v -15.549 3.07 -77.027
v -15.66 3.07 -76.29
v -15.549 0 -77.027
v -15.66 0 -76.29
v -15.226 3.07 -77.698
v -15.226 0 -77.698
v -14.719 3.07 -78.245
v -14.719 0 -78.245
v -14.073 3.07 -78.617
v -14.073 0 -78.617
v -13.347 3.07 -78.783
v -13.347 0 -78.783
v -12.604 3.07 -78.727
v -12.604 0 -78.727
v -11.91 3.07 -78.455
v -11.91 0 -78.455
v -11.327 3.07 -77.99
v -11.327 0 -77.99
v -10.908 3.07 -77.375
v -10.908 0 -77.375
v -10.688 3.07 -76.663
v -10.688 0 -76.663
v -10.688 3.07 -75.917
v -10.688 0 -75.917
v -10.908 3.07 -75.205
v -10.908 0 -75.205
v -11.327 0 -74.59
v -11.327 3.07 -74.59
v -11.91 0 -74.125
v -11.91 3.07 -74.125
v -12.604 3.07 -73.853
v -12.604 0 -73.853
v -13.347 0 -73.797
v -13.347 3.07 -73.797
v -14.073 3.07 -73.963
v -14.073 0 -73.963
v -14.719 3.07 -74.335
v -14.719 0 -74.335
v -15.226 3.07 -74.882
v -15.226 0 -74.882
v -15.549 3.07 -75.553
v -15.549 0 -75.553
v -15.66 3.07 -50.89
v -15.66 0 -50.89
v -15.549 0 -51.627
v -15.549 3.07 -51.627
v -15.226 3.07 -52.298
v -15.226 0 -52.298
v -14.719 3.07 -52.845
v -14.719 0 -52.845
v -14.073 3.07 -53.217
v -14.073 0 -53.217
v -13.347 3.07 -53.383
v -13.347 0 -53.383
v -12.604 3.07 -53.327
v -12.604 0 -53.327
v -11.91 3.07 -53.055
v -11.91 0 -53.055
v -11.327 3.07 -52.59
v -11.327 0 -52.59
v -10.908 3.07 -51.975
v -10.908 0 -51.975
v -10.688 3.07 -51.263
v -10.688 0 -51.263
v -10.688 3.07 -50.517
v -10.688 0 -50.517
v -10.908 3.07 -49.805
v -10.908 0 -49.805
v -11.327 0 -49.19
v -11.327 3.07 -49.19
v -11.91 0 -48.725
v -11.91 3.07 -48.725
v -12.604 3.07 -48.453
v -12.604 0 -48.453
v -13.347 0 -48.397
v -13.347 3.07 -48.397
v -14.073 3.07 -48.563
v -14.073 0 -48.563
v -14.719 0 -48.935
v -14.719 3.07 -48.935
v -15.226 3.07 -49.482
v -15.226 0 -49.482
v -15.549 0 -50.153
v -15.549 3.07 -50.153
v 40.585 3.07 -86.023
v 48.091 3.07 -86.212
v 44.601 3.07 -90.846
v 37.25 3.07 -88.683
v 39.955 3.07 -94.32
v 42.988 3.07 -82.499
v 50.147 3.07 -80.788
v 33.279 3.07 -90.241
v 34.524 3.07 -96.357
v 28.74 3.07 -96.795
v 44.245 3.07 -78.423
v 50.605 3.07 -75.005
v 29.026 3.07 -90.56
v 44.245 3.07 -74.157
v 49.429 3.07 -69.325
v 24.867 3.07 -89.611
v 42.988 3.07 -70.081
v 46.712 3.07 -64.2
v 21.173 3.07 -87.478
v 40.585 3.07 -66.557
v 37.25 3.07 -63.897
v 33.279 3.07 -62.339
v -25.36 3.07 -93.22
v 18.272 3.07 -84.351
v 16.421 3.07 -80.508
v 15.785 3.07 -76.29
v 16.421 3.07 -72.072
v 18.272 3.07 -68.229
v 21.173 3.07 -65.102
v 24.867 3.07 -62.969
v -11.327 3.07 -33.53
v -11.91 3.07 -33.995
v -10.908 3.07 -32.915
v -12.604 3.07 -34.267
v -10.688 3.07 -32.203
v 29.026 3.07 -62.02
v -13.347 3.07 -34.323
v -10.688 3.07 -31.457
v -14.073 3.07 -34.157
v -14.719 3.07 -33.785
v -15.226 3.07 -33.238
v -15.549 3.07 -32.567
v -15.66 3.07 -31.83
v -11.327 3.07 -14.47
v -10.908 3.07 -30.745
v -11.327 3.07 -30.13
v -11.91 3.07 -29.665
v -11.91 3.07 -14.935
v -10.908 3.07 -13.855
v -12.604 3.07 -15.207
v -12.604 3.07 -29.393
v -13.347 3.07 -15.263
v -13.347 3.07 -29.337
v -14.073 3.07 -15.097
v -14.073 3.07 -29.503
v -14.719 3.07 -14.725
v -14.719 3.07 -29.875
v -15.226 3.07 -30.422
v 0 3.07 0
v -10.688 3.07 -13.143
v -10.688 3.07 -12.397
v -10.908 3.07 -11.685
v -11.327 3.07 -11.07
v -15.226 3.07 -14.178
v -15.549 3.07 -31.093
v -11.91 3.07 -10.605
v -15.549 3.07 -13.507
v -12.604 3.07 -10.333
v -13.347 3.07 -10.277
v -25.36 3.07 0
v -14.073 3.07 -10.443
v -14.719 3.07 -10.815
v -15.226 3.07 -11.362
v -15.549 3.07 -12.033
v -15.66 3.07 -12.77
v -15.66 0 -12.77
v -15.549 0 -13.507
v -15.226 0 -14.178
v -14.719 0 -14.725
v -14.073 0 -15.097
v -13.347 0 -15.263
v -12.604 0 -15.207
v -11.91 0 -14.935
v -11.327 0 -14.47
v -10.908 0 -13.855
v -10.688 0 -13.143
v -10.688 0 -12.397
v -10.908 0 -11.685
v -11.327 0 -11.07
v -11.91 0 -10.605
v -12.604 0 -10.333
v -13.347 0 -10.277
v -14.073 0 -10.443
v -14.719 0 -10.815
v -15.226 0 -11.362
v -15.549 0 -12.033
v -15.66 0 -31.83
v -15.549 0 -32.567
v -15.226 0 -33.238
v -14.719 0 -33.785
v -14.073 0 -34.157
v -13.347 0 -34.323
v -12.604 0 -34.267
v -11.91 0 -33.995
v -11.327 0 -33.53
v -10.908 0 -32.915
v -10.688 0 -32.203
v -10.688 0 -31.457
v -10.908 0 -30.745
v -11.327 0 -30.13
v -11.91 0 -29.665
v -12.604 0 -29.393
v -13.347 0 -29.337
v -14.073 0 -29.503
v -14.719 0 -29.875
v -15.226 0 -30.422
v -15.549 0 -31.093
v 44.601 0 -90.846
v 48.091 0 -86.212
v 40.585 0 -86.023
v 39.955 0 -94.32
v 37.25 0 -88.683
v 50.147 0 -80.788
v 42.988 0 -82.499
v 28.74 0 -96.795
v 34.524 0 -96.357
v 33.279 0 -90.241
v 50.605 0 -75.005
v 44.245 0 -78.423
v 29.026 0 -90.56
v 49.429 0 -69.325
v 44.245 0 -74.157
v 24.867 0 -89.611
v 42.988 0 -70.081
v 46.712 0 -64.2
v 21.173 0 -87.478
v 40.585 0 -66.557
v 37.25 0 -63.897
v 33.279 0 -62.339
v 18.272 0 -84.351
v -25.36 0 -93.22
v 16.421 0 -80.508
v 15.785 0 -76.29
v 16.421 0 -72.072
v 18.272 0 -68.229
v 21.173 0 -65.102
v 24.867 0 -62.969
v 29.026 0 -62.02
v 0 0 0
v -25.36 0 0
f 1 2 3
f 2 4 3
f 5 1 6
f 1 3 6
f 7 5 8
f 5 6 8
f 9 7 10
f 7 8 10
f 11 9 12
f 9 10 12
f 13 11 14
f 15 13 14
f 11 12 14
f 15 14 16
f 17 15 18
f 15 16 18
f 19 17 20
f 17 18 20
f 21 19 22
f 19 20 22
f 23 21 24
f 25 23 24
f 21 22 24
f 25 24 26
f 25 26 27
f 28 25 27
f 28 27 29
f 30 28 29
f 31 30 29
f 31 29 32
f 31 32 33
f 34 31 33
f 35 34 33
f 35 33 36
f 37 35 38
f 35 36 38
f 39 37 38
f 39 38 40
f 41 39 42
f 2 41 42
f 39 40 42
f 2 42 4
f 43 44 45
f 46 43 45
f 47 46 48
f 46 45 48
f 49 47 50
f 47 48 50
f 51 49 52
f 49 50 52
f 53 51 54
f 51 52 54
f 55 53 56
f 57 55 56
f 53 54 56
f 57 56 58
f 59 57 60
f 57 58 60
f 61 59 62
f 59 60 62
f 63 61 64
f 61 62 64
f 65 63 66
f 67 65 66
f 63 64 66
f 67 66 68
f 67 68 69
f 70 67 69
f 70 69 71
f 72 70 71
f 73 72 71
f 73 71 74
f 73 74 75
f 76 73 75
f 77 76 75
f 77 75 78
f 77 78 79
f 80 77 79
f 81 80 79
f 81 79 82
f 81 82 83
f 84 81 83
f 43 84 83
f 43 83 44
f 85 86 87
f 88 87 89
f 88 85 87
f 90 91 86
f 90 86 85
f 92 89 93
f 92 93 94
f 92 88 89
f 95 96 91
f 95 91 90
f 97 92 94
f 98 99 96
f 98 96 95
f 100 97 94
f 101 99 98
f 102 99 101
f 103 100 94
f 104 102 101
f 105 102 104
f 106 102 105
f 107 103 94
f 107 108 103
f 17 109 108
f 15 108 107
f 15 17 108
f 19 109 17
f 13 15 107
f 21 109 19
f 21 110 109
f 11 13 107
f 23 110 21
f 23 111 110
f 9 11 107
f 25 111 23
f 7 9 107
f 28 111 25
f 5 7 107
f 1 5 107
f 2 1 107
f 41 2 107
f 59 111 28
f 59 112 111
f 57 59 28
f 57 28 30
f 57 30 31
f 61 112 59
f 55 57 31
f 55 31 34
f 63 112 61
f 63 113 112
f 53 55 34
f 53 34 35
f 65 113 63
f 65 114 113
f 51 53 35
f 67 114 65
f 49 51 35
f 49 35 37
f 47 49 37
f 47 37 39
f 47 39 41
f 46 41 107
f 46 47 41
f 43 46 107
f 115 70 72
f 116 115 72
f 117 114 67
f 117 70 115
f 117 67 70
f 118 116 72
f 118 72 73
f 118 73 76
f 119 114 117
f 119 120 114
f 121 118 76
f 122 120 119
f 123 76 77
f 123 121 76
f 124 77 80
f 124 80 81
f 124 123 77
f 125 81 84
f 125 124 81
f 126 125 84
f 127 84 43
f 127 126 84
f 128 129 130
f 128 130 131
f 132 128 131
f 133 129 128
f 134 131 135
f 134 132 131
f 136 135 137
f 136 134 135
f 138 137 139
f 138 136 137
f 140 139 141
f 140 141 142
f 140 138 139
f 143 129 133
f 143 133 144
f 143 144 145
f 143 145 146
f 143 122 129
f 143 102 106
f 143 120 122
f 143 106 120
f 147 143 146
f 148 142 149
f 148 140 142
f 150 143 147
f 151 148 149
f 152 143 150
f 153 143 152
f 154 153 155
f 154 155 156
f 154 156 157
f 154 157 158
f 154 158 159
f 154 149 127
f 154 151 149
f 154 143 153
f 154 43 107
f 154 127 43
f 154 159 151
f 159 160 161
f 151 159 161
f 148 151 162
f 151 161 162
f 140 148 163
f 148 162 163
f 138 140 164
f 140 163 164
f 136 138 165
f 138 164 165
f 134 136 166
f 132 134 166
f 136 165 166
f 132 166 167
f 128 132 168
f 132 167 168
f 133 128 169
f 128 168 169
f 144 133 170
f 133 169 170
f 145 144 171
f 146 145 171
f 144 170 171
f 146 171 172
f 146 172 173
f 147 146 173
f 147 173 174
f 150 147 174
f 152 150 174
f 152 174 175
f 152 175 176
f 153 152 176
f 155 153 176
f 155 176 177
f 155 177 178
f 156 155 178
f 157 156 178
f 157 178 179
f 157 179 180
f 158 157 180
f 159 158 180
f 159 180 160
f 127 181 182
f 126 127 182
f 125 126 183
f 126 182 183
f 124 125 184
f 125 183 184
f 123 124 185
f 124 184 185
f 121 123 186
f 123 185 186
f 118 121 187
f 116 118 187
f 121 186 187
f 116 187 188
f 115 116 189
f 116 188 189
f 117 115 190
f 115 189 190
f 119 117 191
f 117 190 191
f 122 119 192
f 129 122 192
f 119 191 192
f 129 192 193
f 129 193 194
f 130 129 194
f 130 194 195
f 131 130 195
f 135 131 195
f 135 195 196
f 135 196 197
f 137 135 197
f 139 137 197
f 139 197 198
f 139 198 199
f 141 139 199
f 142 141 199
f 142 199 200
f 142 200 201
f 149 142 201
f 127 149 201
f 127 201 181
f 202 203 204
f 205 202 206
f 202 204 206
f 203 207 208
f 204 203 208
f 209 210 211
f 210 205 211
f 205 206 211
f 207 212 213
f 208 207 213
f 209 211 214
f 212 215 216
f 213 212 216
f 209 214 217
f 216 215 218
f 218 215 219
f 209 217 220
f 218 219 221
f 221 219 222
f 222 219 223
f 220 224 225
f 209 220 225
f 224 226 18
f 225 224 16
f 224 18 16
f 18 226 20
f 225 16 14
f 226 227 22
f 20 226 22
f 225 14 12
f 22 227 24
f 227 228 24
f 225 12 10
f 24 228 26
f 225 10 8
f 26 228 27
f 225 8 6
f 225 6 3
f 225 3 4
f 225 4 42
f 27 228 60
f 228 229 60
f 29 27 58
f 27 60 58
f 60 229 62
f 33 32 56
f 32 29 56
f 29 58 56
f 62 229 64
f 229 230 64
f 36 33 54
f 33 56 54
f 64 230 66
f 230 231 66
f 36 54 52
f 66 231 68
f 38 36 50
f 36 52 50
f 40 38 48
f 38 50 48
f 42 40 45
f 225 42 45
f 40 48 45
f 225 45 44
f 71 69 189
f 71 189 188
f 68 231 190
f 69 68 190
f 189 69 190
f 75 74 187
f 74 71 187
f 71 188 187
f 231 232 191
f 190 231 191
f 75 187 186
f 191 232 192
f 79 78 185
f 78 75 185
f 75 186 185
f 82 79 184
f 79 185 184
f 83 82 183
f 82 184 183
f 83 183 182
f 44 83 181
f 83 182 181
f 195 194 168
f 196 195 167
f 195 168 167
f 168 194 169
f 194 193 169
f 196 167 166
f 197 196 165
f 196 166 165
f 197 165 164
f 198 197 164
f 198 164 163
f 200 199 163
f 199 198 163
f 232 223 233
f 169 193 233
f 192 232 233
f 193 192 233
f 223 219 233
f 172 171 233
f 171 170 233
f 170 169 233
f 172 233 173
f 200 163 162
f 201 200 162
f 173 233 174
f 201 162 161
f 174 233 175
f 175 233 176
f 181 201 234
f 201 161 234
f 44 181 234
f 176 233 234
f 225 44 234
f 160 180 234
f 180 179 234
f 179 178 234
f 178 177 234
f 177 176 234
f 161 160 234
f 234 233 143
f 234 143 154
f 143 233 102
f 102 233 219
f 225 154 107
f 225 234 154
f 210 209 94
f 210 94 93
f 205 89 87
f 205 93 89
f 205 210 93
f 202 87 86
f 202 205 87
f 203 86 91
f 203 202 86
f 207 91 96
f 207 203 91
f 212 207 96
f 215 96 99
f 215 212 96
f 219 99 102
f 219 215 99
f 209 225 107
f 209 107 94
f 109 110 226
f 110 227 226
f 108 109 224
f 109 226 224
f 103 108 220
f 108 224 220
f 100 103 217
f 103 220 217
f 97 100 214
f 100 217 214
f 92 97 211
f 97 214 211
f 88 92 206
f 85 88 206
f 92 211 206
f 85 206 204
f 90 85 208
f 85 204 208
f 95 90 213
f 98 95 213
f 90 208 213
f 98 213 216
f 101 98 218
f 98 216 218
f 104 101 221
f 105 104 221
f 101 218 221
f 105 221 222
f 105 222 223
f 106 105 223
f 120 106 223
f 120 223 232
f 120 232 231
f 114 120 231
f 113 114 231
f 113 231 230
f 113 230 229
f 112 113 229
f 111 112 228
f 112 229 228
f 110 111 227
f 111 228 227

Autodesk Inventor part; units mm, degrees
ref_plane "YZ Plane" through (0, 0, 0) normal (1, 0, 0) x (0, 1, 0)
ref_plane "XZ Plane" through (0, 0, 0) normal (0, 1, 0) x (-1, 0, 0)
ref_plane "XY Plane" through (0, 0, 0) normal (0, 0, 1) x (1, 0, 0)
sketch "Sketch1" plane through (0, 0, 0) normal (0, 1, 0) x (-1, 0, 0)
  line L0 (0, 0) -> (25.36, 0)
  line L1 (25.36, 0) -> (25.36, -93.22)
  line L2 (25.36, 0) -> (13.16, 0)
  line L3 (13.16, 0) -> (13.16, -10.27)
  line L4 (13.16, -10.27) -> (13.16, -12.77)
  circle A0 centre (13.16, -12.77) radius 2.5
  line L5 (13.16, -12.77) -> (13.16, -15.27)
  line L6 (13.16, -15.27) -> (13.16, -29.33)
  line L7 (13.16, -29.33) -> (13.16, -31.83)
  circle A1 centre (13.16, -31.83) radius 2.5
  line L8 (13.16, -31.83) -> (13.16, -34.33)
  line L9 (13.16, -34.33) -> (13.16, -48.39)
  line L10 (13.16, -48.39) -> (13.16, -50.89)
  circle A2 centre (13.16, -50.89) radius 2.5
  line L11 (13.16, -50.89) -> (13.16, -53.39)
  line L12 (13.16, -53.39) -> (13.16, -73.79)
  line L13 (13.16, -73.79) -> (13.16, -76.29)
  circle A3 centre (13.16, -76.29) radius 2.5
  line L14 (13.16, -76.29) -> (10.66, -76.29)
  line L15 (10.66, -76.29) -> (-15.82, -76.29)
  line L16 (-15.82, -76.29) -> (-30.095, -76.29)
  circle A4 centre (-30.095, -76.29) radius 14.31
  line L17 (-30.095, -76.29) -> (-30.095, -90.6)
  line L18 (-30.095, -90.6) -> (-30.095, -96.84)
  arc A5 (-46.7119, -64.1995) -> (-28.7399, -96.7953) centre (-30.095, -76.29) ccw
  line L19 (25.36, -93.22) -> (-28.7399, -96.7953)
  line L20 (0, 0) -> (-46.7119, -64.1995)
  dimension "d25" = 28.62
  dimension "d1" = 25.36
  dimension "d2" = 93.22
  dimension "d3" = 12.2
  dimension "d4" = 10.27
  dimension "d5" = 2.5
  dimension "d10" = 14.06
  dimension "d11" = 2.5
  dimension "d12" = 14.06
  dimension "d13" = 2.5
  dimension "d14" = 20.4
  dimension "d15" = 2.5
  dimension "d16" = 26.48
  dimension "d17" = 14.275
  dimension "d26" = 6.24
extrude "Extrusion2" add sketch "Sketch1" along normal blind 3.07 contours L0 L3 A0 L6 A1 L9 A2 L12 A3 L15 A4 L18 A5 L20 | L0 L1 L19 A5 L18 A4 L15 A3 L12 A2 L9 A1 L6 A0 L3
properties part number "Bracket"
